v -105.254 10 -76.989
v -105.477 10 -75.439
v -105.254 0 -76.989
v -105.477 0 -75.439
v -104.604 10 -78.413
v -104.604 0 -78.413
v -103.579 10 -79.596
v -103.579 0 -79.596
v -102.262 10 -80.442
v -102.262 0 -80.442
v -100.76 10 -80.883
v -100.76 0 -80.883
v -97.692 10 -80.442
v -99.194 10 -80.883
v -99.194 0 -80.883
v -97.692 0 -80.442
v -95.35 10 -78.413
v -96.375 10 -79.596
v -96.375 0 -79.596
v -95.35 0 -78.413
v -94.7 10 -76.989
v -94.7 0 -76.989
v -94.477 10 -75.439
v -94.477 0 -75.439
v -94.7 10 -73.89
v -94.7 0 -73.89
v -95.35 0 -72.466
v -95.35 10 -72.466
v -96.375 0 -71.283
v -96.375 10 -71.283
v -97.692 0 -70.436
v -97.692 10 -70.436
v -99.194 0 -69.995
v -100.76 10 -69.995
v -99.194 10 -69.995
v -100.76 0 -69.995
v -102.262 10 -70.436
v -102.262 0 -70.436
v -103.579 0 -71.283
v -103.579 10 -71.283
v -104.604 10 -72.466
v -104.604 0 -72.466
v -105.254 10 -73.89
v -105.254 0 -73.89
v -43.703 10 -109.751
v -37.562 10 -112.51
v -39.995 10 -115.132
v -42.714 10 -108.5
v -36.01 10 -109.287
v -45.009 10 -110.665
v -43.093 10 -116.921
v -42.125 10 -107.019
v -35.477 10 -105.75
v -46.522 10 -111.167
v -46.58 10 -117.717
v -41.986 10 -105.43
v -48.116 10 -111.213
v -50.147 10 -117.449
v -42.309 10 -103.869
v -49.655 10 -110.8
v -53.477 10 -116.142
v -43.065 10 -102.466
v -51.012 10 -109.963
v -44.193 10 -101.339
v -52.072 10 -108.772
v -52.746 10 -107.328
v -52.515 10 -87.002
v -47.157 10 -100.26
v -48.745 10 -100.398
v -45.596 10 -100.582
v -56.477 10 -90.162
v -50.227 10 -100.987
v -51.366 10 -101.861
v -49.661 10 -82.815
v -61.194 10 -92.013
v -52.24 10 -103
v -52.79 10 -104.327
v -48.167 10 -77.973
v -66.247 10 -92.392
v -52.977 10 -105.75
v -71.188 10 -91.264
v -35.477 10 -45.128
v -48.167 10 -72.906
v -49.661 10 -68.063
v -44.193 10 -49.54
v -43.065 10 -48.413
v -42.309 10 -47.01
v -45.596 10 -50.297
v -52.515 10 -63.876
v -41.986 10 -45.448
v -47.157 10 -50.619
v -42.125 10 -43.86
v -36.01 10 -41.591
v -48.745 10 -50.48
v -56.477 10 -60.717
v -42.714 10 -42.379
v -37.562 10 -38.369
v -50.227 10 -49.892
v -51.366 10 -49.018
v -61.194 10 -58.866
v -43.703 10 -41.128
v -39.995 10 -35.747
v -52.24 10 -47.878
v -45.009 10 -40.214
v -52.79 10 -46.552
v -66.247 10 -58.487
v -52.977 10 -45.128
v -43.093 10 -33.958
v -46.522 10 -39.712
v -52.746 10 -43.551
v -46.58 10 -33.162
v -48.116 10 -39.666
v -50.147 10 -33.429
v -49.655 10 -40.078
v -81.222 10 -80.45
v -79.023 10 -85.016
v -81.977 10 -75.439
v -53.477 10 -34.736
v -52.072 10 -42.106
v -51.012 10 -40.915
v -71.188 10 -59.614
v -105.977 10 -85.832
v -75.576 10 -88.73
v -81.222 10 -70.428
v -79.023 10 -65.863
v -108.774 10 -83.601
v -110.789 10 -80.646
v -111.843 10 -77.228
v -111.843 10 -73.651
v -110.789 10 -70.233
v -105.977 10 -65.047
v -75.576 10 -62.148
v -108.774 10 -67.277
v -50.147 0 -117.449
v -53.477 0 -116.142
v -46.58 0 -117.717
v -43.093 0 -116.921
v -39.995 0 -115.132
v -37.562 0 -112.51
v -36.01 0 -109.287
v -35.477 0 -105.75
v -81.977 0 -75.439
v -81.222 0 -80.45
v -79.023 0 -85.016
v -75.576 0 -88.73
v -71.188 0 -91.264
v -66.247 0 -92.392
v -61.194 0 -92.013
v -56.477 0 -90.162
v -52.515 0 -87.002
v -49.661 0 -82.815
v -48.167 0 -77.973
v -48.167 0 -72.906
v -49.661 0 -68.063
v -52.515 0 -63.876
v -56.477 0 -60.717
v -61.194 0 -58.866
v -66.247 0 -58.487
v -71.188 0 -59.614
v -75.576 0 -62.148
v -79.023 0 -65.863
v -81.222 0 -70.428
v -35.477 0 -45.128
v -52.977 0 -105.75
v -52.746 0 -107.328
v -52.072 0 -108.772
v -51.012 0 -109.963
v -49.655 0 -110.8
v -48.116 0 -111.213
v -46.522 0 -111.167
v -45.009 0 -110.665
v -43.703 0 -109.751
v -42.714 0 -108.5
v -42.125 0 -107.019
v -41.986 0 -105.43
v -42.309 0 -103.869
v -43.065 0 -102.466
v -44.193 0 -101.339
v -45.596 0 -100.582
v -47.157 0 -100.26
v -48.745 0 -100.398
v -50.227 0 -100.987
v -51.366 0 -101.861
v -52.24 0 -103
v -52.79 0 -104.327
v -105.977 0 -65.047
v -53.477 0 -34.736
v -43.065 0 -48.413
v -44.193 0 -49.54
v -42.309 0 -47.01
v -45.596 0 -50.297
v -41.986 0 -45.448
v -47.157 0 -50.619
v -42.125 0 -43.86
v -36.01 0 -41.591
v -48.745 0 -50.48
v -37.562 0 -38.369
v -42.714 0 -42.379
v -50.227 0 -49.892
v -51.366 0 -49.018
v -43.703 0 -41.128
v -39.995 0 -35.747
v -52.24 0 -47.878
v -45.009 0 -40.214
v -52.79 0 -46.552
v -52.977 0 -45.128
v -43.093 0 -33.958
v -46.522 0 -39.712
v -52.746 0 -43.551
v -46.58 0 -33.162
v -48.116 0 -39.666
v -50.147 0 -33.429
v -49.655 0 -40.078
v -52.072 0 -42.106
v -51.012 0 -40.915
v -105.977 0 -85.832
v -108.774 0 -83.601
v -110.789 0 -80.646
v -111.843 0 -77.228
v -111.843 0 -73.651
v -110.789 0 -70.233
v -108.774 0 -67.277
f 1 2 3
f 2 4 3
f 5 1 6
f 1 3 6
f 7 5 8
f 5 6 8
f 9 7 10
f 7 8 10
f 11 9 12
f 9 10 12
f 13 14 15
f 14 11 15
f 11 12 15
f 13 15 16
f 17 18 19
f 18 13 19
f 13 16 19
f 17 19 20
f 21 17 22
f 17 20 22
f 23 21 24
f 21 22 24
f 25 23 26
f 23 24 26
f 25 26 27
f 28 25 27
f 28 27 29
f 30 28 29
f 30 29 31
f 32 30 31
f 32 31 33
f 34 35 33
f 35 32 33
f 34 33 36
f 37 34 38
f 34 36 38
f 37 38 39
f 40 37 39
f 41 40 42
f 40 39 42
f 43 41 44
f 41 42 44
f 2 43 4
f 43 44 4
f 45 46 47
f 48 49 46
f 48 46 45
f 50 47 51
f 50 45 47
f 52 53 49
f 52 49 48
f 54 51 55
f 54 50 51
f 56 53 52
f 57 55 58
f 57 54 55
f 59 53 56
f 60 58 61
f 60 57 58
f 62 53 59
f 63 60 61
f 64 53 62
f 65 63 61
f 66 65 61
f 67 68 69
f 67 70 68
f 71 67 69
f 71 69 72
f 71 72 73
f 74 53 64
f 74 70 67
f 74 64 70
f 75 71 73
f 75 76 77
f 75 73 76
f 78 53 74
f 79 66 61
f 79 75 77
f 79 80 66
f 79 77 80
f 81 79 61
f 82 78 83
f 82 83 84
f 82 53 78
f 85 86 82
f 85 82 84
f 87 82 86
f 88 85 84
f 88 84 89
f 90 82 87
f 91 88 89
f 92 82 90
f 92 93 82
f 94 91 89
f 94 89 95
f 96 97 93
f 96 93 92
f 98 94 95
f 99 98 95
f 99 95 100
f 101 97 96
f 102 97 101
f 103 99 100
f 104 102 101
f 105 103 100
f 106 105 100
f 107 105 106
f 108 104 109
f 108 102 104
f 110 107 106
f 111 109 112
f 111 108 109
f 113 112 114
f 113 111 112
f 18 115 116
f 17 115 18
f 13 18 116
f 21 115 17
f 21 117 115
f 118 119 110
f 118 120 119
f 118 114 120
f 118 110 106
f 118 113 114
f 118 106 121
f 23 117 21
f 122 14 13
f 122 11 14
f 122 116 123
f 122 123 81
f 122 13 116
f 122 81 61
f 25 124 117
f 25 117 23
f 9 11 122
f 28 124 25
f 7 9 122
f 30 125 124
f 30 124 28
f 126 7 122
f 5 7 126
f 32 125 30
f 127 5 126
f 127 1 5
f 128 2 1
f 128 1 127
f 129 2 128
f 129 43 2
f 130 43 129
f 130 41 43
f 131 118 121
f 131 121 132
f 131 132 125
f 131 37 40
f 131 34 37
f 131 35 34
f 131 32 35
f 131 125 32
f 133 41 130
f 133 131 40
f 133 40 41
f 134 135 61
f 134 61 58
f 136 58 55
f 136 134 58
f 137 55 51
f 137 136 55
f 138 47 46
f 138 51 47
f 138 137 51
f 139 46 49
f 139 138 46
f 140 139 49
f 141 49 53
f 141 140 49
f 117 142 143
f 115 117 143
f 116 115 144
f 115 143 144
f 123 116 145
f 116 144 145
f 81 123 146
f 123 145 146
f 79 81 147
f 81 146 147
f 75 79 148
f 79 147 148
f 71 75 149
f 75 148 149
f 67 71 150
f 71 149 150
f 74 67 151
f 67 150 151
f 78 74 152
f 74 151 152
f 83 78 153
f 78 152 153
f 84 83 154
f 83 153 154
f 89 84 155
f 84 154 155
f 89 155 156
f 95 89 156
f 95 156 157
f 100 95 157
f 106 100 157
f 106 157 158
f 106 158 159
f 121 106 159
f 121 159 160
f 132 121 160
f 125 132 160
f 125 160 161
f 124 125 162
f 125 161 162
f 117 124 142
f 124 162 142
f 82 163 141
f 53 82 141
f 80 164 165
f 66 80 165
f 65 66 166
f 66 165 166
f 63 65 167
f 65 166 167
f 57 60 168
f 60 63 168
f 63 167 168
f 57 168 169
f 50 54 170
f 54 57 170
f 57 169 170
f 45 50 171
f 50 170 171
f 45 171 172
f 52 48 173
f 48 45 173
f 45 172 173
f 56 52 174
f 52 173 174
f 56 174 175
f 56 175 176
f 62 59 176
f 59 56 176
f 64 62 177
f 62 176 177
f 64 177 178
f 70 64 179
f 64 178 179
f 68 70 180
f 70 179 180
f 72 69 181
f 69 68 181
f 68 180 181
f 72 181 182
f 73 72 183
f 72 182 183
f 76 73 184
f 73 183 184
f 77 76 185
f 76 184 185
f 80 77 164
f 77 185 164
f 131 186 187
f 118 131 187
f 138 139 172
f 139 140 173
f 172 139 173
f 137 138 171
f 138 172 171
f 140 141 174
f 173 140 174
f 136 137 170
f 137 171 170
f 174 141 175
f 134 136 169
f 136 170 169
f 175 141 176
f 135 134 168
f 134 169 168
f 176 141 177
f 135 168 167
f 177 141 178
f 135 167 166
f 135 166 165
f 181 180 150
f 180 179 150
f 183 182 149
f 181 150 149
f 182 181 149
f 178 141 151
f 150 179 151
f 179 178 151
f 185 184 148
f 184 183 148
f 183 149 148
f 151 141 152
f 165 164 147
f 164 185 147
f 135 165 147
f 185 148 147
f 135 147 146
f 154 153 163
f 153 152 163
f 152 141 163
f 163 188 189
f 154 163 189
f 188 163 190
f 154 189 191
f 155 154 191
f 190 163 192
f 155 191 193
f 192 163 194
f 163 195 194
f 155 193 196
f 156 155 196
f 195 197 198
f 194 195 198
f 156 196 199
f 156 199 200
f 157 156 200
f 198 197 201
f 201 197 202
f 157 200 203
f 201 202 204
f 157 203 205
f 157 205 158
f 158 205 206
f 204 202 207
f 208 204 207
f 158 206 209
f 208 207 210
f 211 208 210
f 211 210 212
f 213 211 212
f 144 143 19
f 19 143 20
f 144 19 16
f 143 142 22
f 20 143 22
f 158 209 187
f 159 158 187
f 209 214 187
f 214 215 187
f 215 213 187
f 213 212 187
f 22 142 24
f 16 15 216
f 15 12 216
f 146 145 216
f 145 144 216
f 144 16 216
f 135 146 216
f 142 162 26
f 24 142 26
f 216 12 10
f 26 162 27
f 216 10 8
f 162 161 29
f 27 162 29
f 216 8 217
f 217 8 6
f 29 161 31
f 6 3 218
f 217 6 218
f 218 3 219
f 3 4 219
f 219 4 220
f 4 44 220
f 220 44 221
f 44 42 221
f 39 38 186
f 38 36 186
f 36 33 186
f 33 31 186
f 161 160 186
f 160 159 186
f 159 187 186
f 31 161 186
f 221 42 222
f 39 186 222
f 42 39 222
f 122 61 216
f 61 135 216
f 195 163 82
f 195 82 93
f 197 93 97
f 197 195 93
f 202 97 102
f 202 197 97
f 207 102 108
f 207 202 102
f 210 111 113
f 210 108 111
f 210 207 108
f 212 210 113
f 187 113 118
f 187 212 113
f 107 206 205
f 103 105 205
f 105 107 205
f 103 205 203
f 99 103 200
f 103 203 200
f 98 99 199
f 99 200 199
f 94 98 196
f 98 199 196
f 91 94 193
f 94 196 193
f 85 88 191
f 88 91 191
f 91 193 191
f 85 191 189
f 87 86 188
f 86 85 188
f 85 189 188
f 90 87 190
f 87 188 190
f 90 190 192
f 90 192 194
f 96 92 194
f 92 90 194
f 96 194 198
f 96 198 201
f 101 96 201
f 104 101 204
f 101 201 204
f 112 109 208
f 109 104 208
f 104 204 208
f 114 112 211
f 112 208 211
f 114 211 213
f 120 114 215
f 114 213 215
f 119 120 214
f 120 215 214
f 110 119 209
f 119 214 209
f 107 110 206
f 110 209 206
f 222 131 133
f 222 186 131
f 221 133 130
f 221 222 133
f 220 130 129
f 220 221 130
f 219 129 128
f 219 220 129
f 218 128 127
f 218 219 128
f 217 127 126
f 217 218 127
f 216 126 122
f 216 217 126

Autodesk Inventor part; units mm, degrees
ref_plane "YZ Plane" through (0, 0, 0) normal (1, 0, 0) x (0, 1, 0)
ref_plane "XZ Plane" through (0, 0, 0) normal (0, 1, 0) x (-1, 0, 0)
ref_plane "XY Plane" through (0, 0, 0) normal (0, 0, 1) x (1, 0, 0)
sketch "Sketch1" plane through (0, 0, 0) normal (0, 1, 0) x (-1, 0, 0)
  circle A0 centre (64.977, -75.4393) radius 17
  line L0 (64.977, -75.4393) -> (99.977, -75.4393)
  line L1 (64.977, -75.4393) -> (47.477, -45.1285)
  line L2 (64.977, -75.4393) -> (47.477, -105.7502)
  circle A1 centre (47.477, -45.1285) radius 12
  circle A2 centre (99.977, -75.4393) radius 12
  circle A3 centre (47.477, -105.7502) radius 12
  circle A4 centre (47.477, -45.1285) radius 5.5
  circle A5 centre (99.977, -75.4393) radius 5.5
  circle A6 centre (47.477, -105.7502) radius 5.5
  line L3 (105.977, -65.047) -> (53.477, -34.7362)
  line L4 (35.477, -45.1285) -> (35.477, -105.7502)
  line L5 (53.477, -116.1425) -> (105.977, -85.8317)
  point P0 (0, 0)
  dimension "d0" = 120
  dimension "d1" = 120
  dimension "d2" = 120
  dimension "d3" = 35
  dimension "d5" = 34
  dimension "d6" = 35
  dimension "d7" = 35
  dimension "d8" = 24
  dimension "d9" = 24
  dimension "d10" = 24
  dimension "d11" = 11
  dimension "d13" = 11
  dimension "d14" = 11
extrude "Extrusion1" add sketch "Sketch1" along normal blind 10 contours L0 A2 L5 A3 L2 A0 | A0 L1 A1 L3 A2 L0 | A0 L2 A3 L4 A1 L1 | A2 | A1 | A3
equation "\"d1\" = d0"
equation "\"d6\" = d3"
equation "\"d7\" = d3"
equation "\"d9\" = d8"
equation "\"d10\" = d8"
equation "\"d13\" = d11"
